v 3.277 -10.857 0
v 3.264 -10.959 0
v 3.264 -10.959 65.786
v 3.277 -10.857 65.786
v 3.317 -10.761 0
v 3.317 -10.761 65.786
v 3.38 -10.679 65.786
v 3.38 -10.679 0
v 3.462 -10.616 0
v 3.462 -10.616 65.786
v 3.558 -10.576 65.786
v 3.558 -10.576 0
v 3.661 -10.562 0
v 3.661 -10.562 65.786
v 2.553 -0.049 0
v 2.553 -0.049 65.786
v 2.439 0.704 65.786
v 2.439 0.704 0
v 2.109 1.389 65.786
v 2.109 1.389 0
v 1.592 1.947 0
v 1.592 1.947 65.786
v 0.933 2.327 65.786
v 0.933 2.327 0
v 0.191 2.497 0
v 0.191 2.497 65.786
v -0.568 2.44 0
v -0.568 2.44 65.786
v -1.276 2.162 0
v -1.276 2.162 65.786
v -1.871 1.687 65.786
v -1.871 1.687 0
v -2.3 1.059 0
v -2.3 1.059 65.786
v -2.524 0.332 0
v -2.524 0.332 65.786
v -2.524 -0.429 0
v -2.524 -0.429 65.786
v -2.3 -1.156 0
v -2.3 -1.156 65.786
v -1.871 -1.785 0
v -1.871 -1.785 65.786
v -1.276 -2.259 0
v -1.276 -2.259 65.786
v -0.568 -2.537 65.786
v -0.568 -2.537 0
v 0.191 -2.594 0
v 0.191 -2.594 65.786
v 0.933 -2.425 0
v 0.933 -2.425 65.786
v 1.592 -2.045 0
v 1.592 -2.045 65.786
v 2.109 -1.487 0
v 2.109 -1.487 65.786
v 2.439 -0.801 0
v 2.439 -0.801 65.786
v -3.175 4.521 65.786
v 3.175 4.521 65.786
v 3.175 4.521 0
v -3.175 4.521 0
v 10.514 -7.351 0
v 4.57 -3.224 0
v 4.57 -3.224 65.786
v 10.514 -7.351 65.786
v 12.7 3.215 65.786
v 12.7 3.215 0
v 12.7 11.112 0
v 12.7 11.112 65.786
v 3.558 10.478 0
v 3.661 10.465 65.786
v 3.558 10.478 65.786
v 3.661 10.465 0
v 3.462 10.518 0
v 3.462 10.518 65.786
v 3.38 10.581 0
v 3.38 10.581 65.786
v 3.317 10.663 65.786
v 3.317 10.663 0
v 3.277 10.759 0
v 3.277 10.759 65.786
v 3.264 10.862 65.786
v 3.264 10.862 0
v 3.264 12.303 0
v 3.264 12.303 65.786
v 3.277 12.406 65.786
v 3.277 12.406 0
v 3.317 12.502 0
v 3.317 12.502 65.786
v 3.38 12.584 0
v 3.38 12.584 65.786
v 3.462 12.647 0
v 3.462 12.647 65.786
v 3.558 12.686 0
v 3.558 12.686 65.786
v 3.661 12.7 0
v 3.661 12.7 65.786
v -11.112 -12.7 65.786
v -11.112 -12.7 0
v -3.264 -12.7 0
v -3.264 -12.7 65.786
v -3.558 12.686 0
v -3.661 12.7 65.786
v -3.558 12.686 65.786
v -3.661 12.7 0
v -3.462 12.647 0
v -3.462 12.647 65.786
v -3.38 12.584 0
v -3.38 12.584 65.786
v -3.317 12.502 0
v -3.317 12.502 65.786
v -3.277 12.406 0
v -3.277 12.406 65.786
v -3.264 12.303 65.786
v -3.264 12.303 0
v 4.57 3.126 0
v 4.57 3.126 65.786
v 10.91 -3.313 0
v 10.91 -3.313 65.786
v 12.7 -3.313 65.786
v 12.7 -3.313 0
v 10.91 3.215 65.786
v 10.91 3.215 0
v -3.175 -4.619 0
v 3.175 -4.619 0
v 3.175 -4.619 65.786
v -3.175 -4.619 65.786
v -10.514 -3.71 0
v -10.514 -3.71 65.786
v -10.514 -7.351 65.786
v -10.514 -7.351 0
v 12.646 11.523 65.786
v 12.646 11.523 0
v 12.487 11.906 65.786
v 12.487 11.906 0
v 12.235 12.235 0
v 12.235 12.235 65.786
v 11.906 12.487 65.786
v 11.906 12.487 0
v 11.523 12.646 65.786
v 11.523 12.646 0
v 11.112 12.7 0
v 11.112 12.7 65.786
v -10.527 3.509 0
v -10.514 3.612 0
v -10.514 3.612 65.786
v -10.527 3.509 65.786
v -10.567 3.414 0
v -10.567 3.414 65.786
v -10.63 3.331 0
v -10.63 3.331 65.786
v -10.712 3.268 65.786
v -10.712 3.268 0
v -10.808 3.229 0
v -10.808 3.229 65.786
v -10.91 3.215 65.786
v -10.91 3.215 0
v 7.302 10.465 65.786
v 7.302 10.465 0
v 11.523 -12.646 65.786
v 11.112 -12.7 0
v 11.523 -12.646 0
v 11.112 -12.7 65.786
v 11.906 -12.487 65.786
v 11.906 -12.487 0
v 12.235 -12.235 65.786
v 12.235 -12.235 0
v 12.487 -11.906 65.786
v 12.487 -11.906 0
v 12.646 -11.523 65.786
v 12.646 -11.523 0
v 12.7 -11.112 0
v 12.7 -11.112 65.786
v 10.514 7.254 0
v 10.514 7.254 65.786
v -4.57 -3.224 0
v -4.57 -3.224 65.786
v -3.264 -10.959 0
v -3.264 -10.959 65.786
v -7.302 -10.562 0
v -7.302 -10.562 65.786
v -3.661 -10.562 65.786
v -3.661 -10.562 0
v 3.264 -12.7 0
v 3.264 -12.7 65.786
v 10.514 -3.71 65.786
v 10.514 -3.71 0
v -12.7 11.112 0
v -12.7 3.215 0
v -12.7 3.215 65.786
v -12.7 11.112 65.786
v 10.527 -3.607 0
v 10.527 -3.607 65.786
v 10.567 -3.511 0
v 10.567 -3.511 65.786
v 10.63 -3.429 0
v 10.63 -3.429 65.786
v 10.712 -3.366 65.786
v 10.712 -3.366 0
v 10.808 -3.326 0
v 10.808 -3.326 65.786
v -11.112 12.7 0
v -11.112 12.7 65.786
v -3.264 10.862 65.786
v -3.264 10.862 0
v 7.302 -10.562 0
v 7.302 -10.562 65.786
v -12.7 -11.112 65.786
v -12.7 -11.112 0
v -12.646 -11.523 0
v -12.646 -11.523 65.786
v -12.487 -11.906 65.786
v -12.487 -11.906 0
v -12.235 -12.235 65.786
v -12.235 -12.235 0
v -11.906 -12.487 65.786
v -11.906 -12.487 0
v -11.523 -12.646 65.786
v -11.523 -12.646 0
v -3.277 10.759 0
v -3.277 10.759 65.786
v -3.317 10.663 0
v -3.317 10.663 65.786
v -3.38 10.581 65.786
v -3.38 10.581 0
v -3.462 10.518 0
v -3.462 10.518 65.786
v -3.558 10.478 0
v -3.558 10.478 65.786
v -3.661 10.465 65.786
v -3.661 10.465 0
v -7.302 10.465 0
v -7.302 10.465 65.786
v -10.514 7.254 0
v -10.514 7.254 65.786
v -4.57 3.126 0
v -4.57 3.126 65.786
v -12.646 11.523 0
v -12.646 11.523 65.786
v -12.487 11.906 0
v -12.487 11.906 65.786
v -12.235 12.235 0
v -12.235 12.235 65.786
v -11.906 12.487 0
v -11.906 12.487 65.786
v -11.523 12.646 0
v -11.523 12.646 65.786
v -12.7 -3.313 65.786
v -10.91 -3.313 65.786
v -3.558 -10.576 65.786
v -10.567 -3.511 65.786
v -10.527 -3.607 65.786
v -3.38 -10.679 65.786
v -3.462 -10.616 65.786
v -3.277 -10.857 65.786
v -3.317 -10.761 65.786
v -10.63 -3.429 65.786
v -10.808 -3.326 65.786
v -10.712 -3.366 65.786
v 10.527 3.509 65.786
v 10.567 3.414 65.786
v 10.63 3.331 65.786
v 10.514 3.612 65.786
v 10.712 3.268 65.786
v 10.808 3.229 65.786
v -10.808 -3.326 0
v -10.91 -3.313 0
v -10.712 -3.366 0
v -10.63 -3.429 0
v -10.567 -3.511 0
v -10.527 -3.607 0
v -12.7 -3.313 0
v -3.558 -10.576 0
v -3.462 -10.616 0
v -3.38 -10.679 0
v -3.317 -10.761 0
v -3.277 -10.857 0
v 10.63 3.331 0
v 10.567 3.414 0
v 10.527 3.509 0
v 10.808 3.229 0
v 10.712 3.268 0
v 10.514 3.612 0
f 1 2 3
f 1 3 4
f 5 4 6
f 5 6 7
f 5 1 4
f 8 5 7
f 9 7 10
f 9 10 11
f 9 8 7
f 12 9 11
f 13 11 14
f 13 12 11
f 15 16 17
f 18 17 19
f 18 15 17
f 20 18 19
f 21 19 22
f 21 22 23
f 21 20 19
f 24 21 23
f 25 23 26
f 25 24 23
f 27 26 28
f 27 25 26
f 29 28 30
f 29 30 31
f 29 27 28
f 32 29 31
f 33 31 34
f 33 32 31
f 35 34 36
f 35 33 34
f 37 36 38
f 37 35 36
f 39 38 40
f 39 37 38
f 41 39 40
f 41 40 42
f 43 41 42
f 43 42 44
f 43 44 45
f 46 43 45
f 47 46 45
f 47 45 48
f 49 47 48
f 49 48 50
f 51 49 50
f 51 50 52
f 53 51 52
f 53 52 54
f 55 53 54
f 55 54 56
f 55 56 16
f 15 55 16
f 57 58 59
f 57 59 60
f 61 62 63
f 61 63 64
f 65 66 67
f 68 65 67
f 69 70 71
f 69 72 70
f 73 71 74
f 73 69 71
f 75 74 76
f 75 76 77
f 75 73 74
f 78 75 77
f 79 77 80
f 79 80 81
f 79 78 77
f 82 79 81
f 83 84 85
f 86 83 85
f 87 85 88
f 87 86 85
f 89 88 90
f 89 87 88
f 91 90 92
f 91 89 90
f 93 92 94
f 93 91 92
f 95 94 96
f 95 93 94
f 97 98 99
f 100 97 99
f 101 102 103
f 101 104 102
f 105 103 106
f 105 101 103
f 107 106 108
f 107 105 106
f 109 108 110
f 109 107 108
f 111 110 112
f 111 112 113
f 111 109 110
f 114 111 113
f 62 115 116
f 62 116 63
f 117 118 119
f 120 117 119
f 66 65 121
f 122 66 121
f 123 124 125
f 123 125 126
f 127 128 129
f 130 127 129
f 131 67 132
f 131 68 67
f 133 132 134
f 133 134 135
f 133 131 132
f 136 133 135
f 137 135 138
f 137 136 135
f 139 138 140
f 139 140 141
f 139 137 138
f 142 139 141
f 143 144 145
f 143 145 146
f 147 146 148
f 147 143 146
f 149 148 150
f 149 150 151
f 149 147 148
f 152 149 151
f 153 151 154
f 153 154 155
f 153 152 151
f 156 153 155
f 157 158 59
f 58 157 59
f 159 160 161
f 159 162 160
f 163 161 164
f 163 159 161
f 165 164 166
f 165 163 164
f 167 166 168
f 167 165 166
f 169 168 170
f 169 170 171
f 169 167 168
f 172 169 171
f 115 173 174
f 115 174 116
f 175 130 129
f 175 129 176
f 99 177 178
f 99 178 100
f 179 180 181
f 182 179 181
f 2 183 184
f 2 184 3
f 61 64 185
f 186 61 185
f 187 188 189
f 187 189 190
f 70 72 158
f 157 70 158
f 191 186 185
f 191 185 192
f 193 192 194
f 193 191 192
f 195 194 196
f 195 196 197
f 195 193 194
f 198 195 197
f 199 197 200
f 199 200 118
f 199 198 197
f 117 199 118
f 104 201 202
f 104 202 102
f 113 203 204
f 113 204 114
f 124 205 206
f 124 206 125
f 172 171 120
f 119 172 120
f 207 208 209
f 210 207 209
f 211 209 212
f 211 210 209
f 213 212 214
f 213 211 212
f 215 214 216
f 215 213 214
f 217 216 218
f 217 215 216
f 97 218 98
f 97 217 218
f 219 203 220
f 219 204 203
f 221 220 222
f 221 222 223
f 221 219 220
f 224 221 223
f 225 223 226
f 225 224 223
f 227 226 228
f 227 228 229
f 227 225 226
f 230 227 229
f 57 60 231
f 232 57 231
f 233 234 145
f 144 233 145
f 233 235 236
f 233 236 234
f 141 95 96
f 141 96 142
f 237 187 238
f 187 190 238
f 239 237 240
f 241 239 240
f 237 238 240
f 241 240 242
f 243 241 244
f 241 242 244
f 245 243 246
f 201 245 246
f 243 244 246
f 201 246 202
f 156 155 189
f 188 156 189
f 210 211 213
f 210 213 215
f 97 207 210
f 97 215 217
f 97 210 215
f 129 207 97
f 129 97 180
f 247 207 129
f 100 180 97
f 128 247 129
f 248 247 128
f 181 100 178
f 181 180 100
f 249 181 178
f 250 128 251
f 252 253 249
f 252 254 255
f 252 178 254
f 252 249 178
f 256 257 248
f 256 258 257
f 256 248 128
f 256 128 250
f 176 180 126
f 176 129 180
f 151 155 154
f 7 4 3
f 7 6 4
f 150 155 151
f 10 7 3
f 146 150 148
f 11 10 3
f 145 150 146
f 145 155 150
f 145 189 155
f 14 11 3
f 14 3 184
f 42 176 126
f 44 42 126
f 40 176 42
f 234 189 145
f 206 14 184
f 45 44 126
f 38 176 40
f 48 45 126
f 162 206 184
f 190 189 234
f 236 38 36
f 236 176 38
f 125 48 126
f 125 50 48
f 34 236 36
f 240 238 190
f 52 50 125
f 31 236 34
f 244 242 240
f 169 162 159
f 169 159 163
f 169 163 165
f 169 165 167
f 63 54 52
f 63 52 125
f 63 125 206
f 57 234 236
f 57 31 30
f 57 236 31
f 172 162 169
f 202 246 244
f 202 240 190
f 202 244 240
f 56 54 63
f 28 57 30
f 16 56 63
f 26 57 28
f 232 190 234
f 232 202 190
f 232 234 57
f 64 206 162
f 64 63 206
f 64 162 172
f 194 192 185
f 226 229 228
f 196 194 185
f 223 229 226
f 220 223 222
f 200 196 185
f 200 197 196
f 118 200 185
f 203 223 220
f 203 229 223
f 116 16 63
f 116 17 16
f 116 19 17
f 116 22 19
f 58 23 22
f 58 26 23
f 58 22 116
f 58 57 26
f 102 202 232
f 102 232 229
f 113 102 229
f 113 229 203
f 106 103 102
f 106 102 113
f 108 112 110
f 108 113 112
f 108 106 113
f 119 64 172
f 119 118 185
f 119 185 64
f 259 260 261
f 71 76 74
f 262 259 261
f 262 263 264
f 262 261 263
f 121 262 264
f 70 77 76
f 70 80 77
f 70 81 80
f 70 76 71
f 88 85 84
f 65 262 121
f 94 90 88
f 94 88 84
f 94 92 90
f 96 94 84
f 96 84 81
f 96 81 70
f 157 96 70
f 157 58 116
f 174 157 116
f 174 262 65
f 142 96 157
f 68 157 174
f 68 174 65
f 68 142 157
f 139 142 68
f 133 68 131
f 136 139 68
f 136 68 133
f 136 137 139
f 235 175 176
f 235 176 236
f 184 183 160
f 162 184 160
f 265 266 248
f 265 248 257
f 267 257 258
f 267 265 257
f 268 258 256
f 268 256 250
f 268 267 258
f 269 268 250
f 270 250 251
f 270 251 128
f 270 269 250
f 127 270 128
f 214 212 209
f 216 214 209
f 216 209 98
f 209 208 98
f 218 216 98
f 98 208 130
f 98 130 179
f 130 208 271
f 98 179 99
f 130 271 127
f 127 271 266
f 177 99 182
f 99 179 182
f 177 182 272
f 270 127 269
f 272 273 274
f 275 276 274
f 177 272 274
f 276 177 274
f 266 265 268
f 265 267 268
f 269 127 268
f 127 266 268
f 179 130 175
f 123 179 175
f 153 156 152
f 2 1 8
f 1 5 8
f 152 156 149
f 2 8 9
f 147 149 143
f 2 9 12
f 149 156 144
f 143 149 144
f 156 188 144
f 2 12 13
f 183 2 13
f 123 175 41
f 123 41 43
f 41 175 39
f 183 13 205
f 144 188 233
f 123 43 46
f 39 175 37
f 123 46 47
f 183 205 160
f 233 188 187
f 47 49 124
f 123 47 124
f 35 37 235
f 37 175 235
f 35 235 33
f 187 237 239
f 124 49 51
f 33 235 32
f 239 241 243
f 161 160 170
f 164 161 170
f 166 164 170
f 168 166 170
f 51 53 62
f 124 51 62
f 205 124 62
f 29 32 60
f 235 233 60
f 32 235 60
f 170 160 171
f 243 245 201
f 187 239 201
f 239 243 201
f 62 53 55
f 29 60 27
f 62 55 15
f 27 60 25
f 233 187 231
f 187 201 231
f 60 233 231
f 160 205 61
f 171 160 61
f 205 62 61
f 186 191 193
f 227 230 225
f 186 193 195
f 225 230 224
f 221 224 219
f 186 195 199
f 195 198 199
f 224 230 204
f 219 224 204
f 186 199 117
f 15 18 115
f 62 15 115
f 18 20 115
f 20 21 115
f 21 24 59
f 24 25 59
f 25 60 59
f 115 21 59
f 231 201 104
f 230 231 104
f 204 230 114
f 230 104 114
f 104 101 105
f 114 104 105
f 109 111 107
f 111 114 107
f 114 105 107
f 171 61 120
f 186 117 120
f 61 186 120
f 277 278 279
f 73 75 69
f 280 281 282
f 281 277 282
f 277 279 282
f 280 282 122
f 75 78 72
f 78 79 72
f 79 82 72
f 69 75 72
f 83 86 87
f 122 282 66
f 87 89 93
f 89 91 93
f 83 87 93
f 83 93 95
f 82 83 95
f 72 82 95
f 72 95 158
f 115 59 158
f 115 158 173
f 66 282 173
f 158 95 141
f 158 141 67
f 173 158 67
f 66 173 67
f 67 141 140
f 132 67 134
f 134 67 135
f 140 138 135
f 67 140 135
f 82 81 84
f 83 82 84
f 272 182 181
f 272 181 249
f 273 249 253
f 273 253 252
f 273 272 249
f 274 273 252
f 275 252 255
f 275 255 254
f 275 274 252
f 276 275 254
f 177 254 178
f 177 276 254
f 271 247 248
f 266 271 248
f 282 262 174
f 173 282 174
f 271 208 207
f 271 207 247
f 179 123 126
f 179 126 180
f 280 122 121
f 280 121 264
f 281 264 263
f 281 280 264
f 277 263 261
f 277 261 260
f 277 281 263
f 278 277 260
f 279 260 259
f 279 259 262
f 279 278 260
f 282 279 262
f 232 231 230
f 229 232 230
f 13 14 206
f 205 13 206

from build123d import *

# Parameters (mm, degrees)
SKETCH1_W                   = 25.4
SKETCH1_H                   = 25.4
BOSS_EXTRUDE1_DEPTH         = 65.786
FILLET1_R                   = 1.5875
HOLE1_OUTLINE_R             = 2.5527
HOLE1_DEPTH                 = 65.786
SKETCH7_W                   = 6.5278
SKETCH7_H                   = 2.2352
CUT_EXTRUDE2_DEPTH          = 65.786
FILLET4_R                   = 0.396875
CIRPATTERN2_DEPTH           = 65.786
F_1_4_20_TAPPED_HOLE1_D     = 5.1054
F_1_4_20_TAPPED_HOLE1_DEPTH = 6.35
F_1_4_20_TAPPED_HOLE1_TIP   = 1.533816902


# Read off the part's stored shape, not the designer's step: Hole1, CirPattern2
with BuildPart() as part:
    # Sketch1 → Boss-Extrude1 (new body)
    with BuildSketch(Plane.XY):
        Rectangle(SKETCH1_W, SKETCH1_H)
    extrude(amount=BOSS_EXTRUDE1_DEPTH)

    # Fillet1
    fillet1_edges = [part.edges().sort_by_distance(p)[0] for p in [
        (12.7, -12.7, 32.893),
        (-12.7, -12.7, 32.893),
        (-12.7, 12.7, 32.893),
        (12.7, 12.7, 32.893),
    ]]
    fillet(fillet1_edges, radius=FILLET1_R)

    # Hole1 outline → Hole1 (cut)
    with BuildSketch(Plane.XY):
        with Locations((0, -0.048792482)):
            Circle(HOLE1_OUTLINE_R)
    extrude(amount=HOLE1_DEPTH, mode=Mode.SUBTRACT)

    # Sketch7 → Cut-Extrude2 (cut)
    with BuildSketch(Plane.XY.offset(65.786)):
        with Locations((0, 11.5824)):
            Rectangle(SKETCH7_W, SKETCH7_H)
        Polygon((-3.175, 4.5212), (-7.3025, 10.4648), (7.3025, 10.4648), (3.175, 4.5212), align=None)
    extrude(amount=-CUT_EXTRUDE2_DEPTH, mode=Mode.SUBTRACT)

    # Fillet4
    fillet4_edges = [part.edges().sort_by_distance(p)[0] for p in [
        (-3.2639, 10.4648, 32.893),
        (-3.2639, 12.7, 32.893),
        (3.2639, 12.7, 32.893),
        (3.2639, 10.4648, 32.893),
    ]]
    fillet(fillet4_edges, radius=FILLET4_R)

    # CirPattern2 outline → CirPattern2 (cut)
    with BuildSketch(Plane.XY):
        with BuildLine():
            ThreePointArc((-3.660775, -10.562384964), (-3.380141996, -10.67862696), (-3.2639, -10.959259964))
            Line((-3.2639, -10.959259964), (-3.2639, -12.7))
            Line((-3.2639, -12.7), (3.2639, -12.7))
            Line((3.2639, -12.7), (3.2639, -10.959259964))
            ThreePointArc((3.2639, -10.959259964), (3.380141996, -10.67862696), (3.660775, -10.562384964))
            Line((3.660775, -10.562384964), (7.3025, -10.562384964))
            Line((7.3025, -10.562384964), (3.175, -4.618784964))
            Line((3.175, -4.618784964), (-3.175, -4.618784964))
            Line((-3.175, -4.618784964), (-7.3025, -10.562384964))
            Line((-7.3025, -10.562384964), (-3.660775, -10.562384964))
        make_face()
        with BuildLine():
            Line((-12.7, -3.312692482), (-10.910467482, -3.312692482))
            ThreePointArc((-10.910467482, -3.312692482), (-10.629834478, -3.428934478), (-10.513592482, -3.709567482))
            Line((-10.513592482, -3.709567482), (-10.513592482, -7.351292482))
            Line((-10.513592482, -7.351292482), (-4.569992482, -3.223792482))
            Line((-4.569992482, -3.223792482), (-4.569992482, 3.126207518))
            Line((-4.569992482, 3.126207518), (-10.513592482, 7.253707518))
            Line((-10.513592482, 7.253707518), (-10.513592482, 3.611982518))
            ThreePointArc((-10.513592482, 3.611982518), (-10.629834478, 3.331349514), (-10.910467482, 3.215107518))
            Line((-10.910467482, 3.215107518), (-12.7, 3.215107518))
            Line((-12.7, 3.215107518), (-12.7, -3.312692482))
        make_face()
        with BuildLine():
            ThreePointArc((10.513592482, -3.709567482), (10.629834478, -3.428934478), (10.910467482, -3.312692482))
            Line((10.910467482, -3.312692482), (12.7, -3.312692482))
            Line((12.7, -3.312692482), (12.7, 3.215107518))
            Line((12.7, 3.215107518), (10.910467482, 3.215107518))
            ThreePointArc((10.910467482, 3.215107518), (10.629834478, 3.331349514), (10.513592482, 3.611982518))
            Line((10.513592482, 3.611982518), (10.513592482, 7.253707518))
            Line((10.513592482, 7.253707518), (4.569992482, 3.126207518))
            Line((4.569992482, 3.126207518), (4.569992482, -3.223792482))
            Line((4.569992482, -3.223792482), (10.513592482, -7.351292482))
            Line((10.513592482, -7.351292482), (10.513592482, -3.709567482))
        make_face()
    extrude(amount=CIRPATTERN2_DEPTH, mode=Mode.SUBTRACT)

    # 1/4-20 Tapped Hole1
    with Locations(Plane(origin=(0, -0.048792482, 65.786), x_dir=(1, 0, 0), z_dir=(0, 0, 1))):
        with Locations((0, 0)):
            Hole(F_1_4_20_TAPPED_HOLE1_D / 2, depth=F_1_4_20_TAPPED_HOLE1_DEPTH)
            with Locations((0, 0, -(F_1_4_20_TAPPED_HOLE1_DEPTH + F_1_4_20_TAPPED_HOLE1_TIP / 2))):  # 118° drill point
                Cone(0, F_1_4_20_TAPPED_HOLE1_D / 2, F_1_4_20_TAPPED_HOLE1_TIP, mode=Mode.SUBTRACT)


solid = part.part
